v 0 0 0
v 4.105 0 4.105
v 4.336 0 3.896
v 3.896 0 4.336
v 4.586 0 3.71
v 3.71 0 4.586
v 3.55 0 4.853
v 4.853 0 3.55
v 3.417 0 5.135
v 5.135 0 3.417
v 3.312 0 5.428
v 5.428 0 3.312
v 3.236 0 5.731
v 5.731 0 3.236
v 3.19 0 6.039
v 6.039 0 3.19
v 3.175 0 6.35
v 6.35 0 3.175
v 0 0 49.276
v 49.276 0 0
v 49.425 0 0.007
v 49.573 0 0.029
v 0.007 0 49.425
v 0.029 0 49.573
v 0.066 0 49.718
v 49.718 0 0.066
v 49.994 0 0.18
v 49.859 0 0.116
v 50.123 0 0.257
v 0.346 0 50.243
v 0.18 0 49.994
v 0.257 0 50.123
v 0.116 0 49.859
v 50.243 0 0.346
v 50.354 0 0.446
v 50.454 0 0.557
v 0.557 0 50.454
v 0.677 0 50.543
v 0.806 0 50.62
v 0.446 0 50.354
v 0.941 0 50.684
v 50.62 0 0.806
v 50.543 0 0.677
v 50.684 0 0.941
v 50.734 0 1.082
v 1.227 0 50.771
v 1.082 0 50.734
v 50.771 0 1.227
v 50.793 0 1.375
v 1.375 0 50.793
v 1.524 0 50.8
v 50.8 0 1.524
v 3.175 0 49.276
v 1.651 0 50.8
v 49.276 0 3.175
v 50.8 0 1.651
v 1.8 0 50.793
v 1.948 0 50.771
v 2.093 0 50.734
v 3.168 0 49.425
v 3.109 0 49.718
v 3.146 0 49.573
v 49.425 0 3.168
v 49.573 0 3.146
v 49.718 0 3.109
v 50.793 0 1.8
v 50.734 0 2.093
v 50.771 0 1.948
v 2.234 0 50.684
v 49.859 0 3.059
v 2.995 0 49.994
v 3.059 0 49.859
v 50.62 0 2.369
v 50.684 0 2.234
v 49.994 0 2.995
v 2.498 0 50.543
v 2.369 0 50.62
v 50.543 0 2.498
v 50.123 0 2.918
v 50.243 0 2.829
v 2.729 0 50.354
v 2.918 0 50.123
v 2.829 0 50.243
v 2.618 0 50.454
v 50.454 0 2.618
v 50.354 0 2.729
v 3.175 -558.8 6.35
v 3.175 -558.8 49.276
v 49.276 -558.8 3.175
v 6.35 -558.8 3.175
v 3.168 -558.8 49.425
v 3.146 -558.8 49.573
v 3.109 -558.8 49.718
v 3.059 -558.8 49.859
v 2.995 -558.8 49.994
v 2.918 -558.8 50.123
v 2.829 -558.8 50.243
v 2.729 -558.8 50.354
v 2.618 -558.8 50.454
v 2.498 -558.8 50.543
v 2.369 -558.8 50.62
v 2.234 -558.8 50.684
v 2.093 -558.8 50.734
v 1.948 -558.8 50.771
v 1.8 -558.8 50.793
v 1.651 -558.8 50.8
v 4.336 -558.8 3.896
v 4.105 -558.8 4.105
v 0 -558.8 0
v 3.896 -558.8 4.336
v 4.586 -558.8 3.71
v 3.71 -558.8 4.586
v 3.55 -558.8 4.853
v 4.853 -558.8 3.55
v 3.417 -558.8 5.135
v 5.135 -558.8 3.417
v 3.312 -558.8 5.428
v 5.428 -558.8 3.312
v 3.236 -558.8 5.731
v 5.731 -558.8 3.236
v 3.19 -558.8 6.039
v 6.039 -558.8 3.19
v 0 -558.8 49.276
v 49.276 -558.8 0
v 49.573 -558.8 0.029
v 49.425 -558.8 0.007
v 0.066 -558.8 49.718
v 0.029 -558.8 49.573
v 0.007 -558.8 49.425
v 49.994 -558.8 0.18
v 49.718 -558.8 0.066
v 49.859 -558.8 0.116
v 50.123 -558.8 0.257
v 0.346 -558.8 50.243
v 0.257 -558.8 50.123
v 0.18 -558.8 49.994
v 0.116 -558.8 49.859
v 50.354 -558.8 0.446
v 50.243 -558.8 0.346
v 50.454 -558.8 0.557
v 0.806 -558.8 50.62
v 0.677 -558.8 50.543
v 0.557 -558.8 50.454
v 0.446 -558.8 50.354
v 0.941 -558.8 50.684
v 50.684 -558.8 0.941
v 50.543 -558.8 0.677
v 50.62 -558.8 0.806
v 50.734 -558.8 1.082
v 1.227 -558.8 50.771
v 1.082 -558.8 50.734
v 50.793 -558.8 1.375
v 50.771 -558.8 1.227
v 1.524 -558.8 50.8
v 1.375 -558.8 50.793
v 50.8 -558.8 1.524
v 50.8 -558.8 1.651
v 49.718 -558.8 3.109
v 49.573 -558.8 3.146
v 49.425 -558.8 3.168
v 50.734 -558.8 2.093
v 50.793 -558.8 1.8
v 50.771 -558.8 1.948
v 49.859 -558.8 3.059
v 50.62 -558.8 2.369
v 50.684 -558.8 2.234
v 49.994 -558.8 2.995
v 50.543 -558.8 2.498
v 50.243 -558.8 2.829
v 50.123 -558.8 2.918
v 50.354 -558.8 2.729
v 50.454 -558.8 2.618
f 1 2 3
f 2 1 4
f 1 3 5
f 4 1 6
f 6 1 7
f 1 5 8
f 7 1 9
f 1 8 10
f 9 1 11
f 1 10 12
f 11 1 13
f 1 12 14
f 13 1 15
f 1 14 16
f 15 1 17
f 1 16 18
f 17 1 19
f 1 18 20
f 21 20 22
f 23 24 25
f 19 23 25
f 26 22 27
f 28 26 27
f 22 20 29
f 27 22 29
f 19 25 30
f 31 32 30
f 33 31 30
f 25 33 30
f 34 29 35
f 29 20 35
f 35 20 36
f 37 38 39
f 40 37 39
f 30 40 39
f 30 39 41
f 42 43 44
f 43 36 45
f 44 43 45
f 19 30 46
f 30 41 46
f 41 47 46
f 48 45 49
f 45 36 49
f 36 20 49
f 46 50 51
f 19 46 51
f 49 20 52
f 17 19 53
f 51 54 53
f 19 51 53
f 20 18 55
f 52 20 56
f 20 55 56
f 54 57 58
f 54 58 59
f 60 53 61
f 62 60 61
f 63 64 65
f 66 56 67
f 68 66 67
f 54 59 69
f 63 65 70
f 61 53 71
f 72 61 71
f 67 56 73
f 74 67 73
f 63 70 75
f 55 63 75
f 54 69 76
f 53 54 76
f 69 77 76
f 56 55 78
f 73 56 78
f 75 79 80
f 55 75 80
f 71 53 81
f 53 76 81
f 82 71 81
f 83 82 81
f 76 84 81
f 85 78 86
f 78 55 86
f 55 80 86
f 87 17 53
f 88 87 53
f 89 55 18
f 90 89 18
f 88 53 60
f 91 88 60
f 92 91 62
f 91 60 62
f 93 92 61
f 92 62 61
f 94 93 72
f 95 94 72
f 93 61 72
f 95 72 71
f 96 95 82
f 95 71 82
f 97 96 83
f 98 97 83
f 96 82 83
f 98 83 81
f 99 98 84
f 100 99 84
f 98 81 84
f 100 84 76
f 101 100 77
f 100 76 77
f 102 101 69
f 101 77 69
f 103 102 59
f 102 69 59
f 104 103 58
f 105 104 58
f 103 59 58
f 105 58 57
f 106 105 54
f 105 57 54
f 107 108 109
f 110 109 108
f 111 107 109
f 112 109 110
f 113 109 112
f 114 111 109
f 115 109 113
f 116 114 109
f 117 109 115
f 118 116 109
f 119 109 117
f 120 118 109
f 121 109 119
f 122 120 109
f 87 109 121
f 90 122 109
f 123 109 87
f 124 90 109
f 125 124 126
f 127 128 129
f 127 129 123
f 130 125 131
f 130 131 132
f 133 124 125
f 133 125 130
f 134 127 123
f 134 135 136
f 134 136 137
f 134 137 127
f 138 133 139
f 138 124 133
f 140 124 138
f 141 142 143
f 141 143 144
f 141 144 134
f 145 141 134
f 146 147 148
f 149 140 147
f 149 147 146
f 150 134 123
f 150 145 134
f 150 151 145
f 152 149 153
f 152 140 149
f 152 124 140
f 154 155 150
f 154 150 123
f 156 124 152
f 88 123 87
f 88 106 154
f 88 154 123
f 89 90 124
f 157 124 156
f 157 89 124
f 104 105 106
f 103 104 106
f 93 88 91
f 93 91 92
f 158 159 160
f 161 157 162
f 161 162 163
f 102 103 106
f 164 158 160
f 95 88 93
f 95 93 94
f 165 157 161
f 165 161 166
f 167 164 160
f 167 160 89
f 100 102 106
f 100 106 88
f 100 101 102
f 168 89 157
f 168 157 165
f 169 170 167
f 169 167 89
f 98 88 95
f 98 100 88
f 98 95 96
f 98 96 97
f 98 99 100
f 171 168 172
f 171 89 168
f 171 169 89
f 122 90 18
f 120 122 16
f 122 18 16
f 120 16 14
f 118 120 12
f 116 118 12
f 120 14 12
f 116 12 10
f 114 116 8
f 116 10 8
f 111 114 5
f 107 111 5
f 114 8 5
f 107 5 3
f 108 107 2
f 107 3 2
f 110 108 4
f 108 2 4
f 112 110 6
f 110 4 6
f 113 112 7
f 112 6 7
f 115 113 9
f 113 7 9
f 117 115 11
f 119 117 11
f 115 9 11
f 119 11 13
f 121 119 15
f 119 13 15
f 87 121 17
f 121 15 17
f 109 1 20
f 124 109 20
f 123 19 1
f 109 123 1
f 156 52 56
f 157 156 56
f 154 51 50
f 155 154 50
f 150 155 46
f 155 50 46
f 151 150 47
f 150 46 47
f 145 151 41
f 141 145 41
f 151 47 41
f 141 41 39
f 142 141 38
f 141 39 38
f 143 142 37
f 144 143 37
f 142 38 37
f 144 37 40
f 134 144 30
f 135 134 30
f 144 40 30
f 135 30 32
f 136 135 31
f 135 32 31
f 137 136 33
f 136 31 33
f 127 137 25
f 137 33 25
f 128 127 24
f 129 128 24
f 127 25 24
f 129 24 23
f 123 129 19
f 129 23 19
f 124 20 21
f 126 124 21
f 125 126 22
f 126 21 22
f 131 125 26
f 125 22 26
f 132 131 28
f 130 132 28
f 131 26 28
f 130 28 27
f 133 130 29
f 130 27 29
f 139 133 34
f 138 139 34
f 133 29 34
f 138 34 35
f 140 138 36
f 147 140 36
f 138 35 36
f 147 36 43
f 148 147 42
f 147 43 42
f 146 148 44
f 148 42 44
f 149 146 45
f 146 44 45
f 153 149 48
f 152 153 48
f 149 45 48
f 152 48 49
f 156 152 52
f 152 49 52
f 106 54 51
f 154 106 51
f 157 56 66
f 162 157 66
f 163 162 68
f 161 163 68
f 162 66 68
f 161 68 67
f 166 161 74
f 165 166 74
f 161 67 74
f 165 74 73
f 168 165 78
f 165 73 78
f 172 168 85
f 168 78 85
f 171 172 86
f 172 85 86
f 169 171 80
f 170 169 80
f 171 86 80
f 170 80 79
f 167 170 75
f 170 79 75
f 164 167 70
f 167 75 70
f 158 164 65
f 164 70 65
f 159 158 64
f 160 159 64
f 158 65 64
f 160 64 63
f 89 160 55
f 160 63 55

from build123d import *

# Parameters (mm, degrees)
F1_DEPTH = 558.8


with BuildPart() as f1:
    # F0 (on Front) → F1 (new body)
    with BuildSketch(Plane.XZ):
        with BuildLine():
            Line((0, 49.276), (0, 0))
            Line((0, 0), (49.276, 0))
            ThreePointArc((49.276, 0), (50.353631, 0.446369), (50.8, 1.524))
            Line((50.8, 1.524), (50.8, 1.651))
            ThreePointArc((50.8, 1.651), (50.353631, 2.728631), (49.276, 3.175))
            Line((49.276, 3.175), (6.35, 3.175))
            ThreePointArc((6.35, 3.175), (4.104936, 4.104936), (3.175, 6.35))
            Line((3.175, 6.35), (3.175, 49.276))
            ThreePointArc((3.175, 49.276), (2.728631, 50.353631), (1.651, 50.8))
            Line((1.651, 50.8), (1.524, 50.8))
            ThreePointArc((1.524, 50.8), (0.446369, 50.353631), (0, 49.276))
        make_face()
    extrude(amount=F1_DEPTH)


solid = f1.part
